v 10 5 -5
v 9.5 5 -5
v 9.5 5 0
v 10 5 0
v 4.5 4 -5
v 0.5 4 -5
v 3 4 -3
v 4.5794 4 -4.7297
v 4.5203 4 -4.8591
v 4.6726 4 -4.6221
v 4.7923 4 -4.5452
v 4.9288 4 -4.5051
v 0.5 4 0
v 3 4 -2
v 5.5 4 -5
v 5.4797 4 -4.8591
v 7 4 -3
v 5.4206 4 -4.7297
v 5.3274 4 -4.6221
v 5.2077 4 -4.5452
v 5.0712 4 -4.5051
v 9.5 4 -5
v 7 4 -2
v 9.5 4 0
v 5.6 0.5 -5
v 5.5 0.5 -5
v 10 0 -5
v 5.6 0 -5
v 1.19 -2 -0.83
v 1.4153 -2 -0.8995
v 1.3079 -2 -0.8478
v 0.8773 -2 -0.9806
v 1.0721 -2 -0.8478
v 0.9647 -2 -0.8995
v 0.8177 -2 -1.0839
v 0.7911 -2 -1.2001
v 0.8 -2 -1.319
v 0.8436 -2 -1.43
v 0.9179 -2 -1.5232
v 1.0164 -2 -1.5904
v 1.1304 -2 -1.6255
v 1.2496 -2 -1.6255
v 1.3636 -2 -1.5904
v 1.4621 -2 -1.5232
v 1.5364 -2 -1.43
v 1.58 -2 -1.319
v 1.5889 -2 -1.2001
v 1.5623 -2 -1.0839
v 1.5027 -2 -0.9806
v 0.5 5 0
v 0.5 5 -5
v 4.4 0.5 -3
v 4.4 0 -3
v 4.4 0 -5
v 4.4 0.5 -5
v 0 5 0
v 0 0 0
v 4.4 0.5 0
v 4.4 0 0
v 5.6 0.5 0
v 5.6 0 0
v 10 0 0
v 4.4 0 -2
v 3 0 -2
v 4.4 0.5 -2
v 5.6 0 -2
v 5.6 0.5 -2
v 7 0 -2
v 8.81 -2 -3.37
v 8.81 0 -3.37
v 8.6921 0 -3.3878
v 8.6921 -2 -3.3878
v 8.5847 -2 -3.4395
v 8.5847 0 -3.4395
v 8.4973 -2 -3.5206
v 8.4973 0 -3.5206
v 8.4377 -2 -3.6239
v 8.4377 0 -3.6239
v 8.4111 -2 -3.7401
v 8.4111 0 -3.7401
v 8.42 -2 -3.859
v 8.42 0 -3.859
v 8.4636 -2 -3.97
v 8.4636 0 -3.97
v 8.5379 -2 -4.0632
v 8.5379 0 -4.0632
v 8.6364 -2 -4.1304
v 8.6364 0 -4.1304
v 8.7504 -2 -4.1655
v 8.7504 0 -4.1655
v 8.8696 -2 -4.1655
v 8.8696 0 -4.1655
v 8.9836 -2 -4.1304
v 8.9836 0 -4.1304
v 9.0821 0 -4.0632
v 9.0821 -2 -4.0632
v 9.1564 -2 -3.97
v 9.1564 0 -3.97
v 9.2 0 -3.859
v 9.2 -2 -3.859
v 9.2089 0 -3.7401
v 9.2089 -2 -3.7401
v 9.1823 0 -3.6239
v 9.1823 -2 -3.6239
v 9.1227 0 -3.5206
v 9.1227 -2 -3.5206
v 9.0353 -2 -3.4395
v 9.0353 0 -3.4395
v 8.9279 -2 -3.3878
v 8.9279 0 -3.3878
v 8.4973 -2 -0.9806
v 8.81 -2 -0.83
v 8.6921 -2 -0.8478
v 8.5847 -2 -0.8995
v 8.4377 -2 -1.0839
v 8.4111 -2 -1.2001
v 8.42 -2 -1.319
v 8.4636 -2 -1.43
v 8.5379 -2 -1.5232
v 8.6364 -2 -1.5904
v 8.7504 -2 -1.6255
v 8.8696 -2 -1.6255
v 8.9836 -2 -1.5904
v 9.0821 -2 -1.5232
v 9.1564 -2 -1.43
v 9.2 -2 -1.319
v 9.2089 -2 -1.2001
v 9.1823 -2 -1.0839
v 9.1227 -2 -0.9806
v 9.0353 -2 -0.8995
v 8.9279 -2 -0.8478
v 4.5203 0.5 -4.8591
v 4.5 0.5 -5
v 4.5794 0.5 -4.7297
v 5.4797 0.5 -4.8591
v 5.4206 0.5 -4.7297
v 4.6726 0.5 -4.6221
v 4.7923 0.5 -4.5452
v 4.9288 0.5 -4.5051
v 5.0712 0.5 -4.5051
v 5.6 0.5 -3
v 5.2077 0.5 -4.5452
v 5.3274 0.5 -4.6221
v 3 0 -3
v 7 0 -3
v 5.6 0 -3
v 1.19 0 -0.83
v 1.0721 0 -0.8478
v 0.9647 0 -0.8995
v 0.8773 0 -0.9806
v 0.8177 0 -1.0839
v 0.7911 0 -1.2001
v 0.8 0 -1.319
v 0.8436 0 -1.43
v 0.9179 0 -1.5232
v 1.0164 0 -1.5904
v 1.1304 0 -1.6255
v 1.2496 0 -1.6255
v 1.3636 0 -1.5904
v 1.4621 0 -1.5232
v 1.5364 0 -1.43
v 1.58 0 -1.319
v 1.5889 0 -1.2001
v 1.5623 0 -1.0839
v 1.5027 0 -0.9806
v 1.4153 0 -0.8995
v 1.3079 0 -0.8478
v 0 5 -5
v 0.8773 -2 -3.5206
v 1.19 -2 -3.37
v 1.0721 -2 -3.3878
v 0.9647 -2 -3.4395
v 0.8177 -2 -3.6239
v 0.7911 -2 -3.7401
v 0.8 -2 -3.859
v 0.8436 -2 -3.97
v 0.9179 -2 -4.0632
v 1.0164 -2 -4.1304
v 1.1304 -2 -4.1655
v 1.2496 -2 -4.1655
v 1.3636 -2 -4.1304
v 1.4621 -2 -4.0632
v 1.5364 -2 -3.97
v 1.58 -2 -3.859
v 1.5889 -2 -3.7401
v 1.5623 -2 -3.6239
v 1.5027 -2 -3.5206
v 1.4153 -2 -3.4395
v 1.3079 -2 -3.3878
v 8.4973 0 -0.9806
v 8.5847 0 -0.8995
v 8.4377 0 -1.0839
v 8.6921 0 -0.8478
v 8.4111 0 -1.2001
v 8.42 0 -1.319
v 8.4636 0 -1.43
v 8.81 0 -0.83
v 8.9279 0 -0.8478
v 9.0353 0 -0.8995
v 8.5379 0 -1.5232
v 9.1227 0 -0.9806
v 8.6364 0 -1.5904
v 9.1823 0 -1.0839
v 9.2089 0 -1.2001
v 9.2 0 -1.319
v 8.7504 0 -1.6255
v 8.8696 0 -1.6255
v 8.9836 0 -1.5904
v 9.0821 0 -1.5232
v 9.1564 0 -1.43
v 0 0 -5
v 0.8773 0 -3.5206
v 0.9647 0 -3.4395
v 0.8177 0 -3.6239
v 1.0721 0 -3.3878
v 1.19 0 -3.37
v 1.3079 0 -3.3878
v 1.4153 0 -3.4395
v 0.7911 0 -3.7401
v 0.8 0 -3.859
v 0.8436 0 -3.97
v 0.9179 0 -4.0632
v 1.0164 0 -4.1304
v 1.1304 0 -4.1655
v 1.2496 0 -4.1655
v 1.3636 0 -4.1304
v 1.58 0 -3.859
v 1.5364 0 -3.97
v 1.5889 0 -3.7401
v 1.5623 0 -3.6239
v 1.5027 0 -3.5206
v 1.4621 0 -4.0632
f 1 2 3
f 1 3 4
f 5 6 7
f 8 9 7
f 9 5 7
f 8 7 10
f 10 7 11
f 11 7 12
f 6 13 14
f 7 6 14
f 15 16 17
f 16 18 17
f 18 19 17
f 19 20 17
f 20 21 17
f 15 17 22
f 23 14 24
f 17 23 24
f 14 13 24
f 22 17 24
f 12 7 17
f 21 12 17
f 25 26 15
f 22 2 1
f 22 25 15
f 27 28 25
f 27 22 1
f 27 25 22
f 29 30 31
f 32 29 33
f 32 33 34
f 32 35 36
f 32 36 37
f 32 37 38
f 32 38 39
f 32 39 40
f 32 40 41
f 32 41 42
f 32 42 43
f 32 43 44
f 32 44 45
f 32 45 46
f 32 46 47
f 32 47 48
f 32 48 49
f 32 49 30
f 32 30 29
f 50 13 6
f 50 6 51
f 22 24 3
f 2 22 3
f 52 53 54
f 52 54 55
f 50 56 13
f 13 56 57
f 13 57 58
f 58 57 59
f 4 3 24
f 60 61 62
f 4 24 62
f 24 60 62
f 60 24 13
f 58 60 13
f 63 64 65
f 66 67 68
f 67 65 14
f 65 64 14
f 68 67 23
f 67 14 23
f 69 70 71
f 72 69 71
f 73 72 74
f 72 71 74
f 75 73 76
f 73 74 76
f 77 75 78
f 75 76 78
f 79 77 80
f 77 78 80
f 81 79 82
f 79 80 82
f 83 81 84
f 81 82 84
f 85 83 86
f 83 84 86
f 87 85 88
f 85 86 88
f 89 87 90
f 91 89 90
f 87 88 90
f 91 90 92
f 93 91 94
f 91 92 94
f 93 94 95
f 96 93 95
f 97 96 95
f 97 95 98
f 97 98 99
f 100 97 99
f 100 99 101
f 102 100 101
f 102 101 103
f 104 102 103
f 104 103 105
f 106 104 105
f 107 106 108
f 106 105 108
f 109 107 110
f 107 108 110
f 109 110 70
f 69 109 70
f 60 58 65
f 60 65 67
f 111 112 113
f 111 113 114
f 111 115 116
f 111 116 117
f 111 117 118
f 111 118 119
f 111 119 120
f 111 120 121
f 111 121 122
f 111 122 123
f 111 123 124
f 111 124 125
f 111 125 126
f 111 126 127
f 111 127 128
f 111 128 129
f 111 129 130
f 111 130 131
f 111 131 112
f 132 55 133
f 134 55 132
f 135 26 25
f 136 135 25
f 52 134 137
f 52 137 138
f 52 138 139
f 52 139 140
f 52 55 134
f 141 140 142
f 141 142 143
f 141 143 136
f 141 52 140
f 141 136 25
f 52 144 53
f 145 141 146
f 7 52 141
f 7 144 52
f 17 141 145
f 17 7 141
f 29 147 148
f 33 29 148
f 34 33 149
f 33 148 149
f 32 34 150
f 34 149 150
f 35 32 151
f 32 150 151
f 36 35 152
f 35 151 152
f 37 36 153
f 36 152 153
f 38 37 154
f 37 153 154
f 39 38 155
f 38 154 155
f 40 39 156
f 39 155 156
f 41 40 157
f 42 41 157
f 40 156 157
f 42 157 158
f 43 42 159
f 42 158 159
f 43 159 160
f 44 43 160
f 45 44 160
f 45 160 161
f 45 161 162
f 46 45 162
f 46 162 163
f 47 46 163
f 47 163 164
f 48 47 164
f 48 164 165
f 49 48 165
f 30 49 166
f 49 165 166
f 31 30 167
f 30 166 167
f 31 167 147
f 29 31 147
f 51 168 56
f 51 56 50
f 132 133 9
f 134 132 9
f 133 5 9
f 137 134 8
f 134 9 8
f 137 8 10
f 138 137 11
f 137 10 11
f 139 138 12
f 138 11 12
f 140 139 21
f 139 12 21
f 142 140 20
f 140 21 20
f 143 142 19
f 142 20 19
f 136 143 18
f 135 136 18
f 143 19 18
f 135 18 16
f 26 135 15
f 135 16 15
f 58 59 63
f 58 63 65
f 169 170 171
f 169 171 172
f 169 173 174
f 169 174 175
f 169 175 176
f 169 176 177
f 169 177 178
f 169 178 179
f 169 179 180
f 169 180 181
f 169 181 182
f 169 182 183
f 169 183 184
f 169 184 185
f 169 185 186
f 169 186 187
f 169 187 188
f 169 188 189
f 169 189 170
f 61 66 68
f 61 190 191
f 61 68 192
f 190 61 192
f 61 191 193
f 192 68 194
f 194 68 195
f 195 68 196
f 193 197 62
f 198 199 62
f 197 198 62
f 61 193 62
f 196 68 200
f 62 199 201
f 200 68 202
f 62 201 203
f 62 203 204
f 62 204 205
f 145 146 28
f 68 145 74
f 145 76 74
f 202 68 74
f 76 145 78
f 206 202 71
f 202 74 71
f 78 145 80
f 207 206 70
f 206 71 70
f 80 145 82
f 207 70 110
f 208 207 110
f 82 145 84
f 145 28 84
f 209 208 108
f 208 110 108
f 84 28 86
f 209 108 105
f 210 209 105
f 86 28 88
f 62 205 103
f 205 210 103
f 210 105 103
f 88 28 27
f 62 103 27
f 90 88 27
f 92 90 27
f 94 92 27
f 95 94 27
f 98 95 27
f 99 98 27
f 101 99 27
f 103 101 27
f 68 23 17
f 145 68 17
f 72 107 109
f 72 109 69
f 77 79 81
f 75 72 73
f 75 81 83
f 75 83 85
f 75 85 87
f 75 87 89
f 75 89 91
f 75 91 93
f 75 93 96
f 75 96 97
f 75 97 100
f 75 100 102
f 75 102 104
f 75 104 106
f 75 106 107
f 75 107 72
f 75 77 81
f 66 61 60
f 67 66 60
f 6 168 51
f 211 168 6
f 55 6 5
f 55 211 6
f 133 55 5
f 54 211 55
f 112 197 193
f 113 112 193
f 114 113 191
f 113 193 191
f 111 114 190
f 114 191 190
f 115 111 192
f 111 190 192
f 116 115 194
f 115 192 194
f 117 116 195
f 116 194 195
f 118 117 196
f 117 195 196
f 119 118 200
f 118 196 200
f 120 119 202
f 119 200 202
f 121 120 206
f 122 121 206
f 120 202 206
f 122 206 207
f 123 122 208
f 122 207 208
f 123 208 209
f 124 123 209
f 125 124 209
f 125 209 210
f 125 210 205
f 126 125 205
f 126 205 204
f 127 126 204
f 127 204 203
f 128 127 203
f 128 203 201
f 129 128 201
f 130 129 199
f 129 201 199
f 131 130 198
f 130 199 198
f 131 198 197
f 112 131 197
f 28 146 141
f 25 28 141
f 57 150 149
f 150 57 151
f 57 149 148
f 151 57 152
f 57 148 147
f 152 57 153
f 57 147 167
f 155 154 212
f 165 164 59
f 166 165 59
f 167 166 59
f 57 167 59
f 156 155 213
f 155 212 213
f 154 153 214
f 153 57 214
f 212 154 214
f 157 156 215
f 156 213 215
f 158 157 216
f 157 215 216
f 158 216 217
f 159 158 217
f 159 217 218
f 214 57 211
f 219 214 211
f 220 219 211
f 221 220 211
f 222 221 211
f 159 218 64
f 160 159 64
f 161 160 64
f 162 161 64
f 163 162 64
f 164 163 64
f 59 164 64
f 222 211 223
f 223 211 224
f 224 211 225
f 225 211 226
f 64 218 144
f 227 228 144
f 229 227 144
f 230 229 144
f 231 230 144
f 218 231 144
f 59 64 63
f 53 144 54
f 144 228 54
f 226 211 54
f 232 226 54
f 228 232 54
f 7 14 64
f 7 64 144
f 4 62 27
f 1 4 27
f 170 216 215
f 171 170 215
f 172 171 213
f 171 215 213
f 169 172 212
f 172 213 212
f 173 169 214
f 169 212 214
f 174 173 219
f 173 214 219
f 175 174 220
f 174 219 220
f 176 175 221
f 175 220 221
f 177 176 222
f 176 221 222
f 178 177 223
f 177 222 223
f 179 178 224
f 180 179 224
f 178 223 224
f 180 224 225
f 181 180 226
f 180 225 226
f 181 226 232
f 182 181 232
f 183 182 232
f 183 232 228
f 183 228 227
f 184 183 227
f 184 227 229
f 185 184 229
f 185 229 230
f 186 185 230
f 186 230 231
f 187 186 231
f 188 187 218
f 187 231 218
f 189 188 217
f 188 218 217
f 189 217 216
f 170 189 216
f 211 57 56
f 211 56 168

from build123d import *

# Parameters (mm, degrees)
SKETCH_1_W          = 10
SKETCH_1_H          = 5
EXTRUDE_1_DEPTH     = 5
CUT_EXTRUDE_1_REACH = 14.247
SKETCH_2_R          = 0.5
CUT_EXTRUDE_2_REACH = 14.247
SKETCH_4_W          = 4.5
SKETCH_4_H          = 1
SKETCH_4_W_2        = 0.6
SKETCH_4_H_2        = 0.5
CUT_EXTRUDE_3_REACH = 13.874
SKETCH_5_W          = 4
SKETCH_5_H          = 1
SKETCH_6_R          = 0.4
EXTRUDE_2_DEPTH     = 2


with BuildPart() as part:
    # 草图1 → 凸台-拉伸1 (new body)
    with BuildSketch(Plane(origin=(0, 0, 0), x_dir=(1, 0, 0), z_dir=(0, 1, 0))):
        with Locations((5, 2.5)):
            Rectangle(SKETCH_1_W, SKETCH_1_H)
    extrude(amount=EXTRUDE_1_DEPTH)

    # 草图2 → 切除-拉伸1 (cut, up to next)
    with BuildSketch(Plane(origin=(0, 5, 0), x_dir=(-1, 0, 0), z_dir=(0, 1, 0)), mode=Mode.PRIVATE) as cut_extrude_1_sk1:
        with Locations((-5, -5)):
            Circle(SKETCH_2_R)
    cut_extrude_1_tool1 = extrude(cut_extrude_1_sk1.sketch, amount=-CUT_EXTRUDE_1_REACH, mode=Mode.PRIVATE) & part.part
    add(cut_extrude_1_tool1.solids().sort_by_distance((5, 5, -5))[0], mode=Mode.SUBTRACT)

    # 草图4 → 切除-拉伸2 (cut, up to next)
    with BuildSketch(Plane.XY, mode=Mode.PRIVATE) as cut_extrude_2_sk1:
        with Locations((2.75, 4.5)):
            Rectangle(SKETCH_4_W, SKETCH_4_H)
    cut_extrude_2_tool1 = extrude(cut_extrude_2_sk1.sketch, amount=-CUT_EXTRUDE_2_REACH, mode=Mode.PRIVATE) & part.part
    # 草图4 → 切除-拉伸2 (cut, up to next)
    with BuildSketch(Plane.XY, mode=Mode.PRIVATE) as cut_extrude_2_sk2:
        with Locations((7.25, 4.5)):
            Rectangle(SKETCH_4_W, SKETCH_4_H)
    cut_extrude_2_tool2 = extrude(cut_extrude_2_sk2.sketch, amount=-CUT_EXTRUDE_2_REACH, mode=Mode.PRIVATE) & part.part
    # 草图4 → 切除-拉伸2 (cut, up to next)
    with BuildSketch(Plane.XY, mode=Mode.PRIVATE) as cut_extrude_2_sk3:
        with Locations((4.7, 0.25)):
            Rectangle(SKETCH_4_W_2, SKETCH_4_H_2)
    cut_extrude_2_tool3 = extrude(cut_extrude_2_sk3.sketch, amount=-CUT_EXTRUDE_2_REACH, mode=Mode.PRIVATE) & part.part
    # 草图4 → 切除-拉伸2 (cut, up to next)
    with BuildSketch(Plane.XY, mode=Mode.PRIVATE) as cut_extrude_2_sk4:
        with Locations((5.3, 0.25)):
            Rectangle(SKETCH_4_W_2, SKETCH_4_H_2)
    cut_extrude_2_tool4 = extrude(cut_extrude_2_sk4.sketch, amount=-CUT_EXTRUDE_2_REACH, mode=Mode.PRIVATE) & part.part
    add(cut_extrude_2_tool1.solids().sort_by_distance((2.75, 4.5, 0))[0], mode=Mode.SUBTRACT)
    add(cut_extrude_2_tool2.solids().sort_by_distance((7.25, 4.5, 0))[0], mode=Mode.SUBTRACT)
    add(cut_extrude_2_tool3.solids().sort_by_distance((4.7, 0.25, 0))[0], mode=Mode.SUBTRACT)
    add(cut_extrude_2_tool4.solids().sort_by_distance((5.3, 0.25, 0))[0], mode=Mode.SUBTRACT)

    # 草图5 → 切除-拉伸3 (cut, up to next)
    with BuildSketch(Plane(origin=(0, 4, 0), x_dir=(1, 0, 0), z_dir=(0, 1, 0)), mode=Mode.PRIVATE) as cut_extrude_3_sk1:
        with Locations((5, 2.5)):
            Rectangle(SKETCH_5_W, SKETCH_5_H)
    cut_extrude_3_tool1 = extrude(cut_extrude_3_sk1.sketch, amount=-CUT_EXTRUDE_3_REACH, mode=Mode.PRIVATE) & part.part
    add(cut_extrude_3_tool1.solids().sort_by_distance((5, 4, -2.5))[0], mode=Mode.SUBTRACT)

    # 草图6 → 凸台-拉伸2 (add)
    with BuildSketch(Plane.XZ):
        with Locations(Location((1.19, -1.23, 0), (0, 0, 90))):
            Circle(SKETCH_6_R)
        with Locations(Location((1.19, -3.77, 0), (0, 0, 90))):
            Circle(SKETCH_6_R)
        with Locations(Location((8.81, -3.77, 0), (0, 0, 90))):
            Circle(SKETCH_6_R)
        with Locations(Location((8.81, -1.23, 0), (0, 0, 90))):
            Circle(SKETCH_6_R)
    extrude(amount=EXTRUDE_2_DEPTH)


solid = part.part
